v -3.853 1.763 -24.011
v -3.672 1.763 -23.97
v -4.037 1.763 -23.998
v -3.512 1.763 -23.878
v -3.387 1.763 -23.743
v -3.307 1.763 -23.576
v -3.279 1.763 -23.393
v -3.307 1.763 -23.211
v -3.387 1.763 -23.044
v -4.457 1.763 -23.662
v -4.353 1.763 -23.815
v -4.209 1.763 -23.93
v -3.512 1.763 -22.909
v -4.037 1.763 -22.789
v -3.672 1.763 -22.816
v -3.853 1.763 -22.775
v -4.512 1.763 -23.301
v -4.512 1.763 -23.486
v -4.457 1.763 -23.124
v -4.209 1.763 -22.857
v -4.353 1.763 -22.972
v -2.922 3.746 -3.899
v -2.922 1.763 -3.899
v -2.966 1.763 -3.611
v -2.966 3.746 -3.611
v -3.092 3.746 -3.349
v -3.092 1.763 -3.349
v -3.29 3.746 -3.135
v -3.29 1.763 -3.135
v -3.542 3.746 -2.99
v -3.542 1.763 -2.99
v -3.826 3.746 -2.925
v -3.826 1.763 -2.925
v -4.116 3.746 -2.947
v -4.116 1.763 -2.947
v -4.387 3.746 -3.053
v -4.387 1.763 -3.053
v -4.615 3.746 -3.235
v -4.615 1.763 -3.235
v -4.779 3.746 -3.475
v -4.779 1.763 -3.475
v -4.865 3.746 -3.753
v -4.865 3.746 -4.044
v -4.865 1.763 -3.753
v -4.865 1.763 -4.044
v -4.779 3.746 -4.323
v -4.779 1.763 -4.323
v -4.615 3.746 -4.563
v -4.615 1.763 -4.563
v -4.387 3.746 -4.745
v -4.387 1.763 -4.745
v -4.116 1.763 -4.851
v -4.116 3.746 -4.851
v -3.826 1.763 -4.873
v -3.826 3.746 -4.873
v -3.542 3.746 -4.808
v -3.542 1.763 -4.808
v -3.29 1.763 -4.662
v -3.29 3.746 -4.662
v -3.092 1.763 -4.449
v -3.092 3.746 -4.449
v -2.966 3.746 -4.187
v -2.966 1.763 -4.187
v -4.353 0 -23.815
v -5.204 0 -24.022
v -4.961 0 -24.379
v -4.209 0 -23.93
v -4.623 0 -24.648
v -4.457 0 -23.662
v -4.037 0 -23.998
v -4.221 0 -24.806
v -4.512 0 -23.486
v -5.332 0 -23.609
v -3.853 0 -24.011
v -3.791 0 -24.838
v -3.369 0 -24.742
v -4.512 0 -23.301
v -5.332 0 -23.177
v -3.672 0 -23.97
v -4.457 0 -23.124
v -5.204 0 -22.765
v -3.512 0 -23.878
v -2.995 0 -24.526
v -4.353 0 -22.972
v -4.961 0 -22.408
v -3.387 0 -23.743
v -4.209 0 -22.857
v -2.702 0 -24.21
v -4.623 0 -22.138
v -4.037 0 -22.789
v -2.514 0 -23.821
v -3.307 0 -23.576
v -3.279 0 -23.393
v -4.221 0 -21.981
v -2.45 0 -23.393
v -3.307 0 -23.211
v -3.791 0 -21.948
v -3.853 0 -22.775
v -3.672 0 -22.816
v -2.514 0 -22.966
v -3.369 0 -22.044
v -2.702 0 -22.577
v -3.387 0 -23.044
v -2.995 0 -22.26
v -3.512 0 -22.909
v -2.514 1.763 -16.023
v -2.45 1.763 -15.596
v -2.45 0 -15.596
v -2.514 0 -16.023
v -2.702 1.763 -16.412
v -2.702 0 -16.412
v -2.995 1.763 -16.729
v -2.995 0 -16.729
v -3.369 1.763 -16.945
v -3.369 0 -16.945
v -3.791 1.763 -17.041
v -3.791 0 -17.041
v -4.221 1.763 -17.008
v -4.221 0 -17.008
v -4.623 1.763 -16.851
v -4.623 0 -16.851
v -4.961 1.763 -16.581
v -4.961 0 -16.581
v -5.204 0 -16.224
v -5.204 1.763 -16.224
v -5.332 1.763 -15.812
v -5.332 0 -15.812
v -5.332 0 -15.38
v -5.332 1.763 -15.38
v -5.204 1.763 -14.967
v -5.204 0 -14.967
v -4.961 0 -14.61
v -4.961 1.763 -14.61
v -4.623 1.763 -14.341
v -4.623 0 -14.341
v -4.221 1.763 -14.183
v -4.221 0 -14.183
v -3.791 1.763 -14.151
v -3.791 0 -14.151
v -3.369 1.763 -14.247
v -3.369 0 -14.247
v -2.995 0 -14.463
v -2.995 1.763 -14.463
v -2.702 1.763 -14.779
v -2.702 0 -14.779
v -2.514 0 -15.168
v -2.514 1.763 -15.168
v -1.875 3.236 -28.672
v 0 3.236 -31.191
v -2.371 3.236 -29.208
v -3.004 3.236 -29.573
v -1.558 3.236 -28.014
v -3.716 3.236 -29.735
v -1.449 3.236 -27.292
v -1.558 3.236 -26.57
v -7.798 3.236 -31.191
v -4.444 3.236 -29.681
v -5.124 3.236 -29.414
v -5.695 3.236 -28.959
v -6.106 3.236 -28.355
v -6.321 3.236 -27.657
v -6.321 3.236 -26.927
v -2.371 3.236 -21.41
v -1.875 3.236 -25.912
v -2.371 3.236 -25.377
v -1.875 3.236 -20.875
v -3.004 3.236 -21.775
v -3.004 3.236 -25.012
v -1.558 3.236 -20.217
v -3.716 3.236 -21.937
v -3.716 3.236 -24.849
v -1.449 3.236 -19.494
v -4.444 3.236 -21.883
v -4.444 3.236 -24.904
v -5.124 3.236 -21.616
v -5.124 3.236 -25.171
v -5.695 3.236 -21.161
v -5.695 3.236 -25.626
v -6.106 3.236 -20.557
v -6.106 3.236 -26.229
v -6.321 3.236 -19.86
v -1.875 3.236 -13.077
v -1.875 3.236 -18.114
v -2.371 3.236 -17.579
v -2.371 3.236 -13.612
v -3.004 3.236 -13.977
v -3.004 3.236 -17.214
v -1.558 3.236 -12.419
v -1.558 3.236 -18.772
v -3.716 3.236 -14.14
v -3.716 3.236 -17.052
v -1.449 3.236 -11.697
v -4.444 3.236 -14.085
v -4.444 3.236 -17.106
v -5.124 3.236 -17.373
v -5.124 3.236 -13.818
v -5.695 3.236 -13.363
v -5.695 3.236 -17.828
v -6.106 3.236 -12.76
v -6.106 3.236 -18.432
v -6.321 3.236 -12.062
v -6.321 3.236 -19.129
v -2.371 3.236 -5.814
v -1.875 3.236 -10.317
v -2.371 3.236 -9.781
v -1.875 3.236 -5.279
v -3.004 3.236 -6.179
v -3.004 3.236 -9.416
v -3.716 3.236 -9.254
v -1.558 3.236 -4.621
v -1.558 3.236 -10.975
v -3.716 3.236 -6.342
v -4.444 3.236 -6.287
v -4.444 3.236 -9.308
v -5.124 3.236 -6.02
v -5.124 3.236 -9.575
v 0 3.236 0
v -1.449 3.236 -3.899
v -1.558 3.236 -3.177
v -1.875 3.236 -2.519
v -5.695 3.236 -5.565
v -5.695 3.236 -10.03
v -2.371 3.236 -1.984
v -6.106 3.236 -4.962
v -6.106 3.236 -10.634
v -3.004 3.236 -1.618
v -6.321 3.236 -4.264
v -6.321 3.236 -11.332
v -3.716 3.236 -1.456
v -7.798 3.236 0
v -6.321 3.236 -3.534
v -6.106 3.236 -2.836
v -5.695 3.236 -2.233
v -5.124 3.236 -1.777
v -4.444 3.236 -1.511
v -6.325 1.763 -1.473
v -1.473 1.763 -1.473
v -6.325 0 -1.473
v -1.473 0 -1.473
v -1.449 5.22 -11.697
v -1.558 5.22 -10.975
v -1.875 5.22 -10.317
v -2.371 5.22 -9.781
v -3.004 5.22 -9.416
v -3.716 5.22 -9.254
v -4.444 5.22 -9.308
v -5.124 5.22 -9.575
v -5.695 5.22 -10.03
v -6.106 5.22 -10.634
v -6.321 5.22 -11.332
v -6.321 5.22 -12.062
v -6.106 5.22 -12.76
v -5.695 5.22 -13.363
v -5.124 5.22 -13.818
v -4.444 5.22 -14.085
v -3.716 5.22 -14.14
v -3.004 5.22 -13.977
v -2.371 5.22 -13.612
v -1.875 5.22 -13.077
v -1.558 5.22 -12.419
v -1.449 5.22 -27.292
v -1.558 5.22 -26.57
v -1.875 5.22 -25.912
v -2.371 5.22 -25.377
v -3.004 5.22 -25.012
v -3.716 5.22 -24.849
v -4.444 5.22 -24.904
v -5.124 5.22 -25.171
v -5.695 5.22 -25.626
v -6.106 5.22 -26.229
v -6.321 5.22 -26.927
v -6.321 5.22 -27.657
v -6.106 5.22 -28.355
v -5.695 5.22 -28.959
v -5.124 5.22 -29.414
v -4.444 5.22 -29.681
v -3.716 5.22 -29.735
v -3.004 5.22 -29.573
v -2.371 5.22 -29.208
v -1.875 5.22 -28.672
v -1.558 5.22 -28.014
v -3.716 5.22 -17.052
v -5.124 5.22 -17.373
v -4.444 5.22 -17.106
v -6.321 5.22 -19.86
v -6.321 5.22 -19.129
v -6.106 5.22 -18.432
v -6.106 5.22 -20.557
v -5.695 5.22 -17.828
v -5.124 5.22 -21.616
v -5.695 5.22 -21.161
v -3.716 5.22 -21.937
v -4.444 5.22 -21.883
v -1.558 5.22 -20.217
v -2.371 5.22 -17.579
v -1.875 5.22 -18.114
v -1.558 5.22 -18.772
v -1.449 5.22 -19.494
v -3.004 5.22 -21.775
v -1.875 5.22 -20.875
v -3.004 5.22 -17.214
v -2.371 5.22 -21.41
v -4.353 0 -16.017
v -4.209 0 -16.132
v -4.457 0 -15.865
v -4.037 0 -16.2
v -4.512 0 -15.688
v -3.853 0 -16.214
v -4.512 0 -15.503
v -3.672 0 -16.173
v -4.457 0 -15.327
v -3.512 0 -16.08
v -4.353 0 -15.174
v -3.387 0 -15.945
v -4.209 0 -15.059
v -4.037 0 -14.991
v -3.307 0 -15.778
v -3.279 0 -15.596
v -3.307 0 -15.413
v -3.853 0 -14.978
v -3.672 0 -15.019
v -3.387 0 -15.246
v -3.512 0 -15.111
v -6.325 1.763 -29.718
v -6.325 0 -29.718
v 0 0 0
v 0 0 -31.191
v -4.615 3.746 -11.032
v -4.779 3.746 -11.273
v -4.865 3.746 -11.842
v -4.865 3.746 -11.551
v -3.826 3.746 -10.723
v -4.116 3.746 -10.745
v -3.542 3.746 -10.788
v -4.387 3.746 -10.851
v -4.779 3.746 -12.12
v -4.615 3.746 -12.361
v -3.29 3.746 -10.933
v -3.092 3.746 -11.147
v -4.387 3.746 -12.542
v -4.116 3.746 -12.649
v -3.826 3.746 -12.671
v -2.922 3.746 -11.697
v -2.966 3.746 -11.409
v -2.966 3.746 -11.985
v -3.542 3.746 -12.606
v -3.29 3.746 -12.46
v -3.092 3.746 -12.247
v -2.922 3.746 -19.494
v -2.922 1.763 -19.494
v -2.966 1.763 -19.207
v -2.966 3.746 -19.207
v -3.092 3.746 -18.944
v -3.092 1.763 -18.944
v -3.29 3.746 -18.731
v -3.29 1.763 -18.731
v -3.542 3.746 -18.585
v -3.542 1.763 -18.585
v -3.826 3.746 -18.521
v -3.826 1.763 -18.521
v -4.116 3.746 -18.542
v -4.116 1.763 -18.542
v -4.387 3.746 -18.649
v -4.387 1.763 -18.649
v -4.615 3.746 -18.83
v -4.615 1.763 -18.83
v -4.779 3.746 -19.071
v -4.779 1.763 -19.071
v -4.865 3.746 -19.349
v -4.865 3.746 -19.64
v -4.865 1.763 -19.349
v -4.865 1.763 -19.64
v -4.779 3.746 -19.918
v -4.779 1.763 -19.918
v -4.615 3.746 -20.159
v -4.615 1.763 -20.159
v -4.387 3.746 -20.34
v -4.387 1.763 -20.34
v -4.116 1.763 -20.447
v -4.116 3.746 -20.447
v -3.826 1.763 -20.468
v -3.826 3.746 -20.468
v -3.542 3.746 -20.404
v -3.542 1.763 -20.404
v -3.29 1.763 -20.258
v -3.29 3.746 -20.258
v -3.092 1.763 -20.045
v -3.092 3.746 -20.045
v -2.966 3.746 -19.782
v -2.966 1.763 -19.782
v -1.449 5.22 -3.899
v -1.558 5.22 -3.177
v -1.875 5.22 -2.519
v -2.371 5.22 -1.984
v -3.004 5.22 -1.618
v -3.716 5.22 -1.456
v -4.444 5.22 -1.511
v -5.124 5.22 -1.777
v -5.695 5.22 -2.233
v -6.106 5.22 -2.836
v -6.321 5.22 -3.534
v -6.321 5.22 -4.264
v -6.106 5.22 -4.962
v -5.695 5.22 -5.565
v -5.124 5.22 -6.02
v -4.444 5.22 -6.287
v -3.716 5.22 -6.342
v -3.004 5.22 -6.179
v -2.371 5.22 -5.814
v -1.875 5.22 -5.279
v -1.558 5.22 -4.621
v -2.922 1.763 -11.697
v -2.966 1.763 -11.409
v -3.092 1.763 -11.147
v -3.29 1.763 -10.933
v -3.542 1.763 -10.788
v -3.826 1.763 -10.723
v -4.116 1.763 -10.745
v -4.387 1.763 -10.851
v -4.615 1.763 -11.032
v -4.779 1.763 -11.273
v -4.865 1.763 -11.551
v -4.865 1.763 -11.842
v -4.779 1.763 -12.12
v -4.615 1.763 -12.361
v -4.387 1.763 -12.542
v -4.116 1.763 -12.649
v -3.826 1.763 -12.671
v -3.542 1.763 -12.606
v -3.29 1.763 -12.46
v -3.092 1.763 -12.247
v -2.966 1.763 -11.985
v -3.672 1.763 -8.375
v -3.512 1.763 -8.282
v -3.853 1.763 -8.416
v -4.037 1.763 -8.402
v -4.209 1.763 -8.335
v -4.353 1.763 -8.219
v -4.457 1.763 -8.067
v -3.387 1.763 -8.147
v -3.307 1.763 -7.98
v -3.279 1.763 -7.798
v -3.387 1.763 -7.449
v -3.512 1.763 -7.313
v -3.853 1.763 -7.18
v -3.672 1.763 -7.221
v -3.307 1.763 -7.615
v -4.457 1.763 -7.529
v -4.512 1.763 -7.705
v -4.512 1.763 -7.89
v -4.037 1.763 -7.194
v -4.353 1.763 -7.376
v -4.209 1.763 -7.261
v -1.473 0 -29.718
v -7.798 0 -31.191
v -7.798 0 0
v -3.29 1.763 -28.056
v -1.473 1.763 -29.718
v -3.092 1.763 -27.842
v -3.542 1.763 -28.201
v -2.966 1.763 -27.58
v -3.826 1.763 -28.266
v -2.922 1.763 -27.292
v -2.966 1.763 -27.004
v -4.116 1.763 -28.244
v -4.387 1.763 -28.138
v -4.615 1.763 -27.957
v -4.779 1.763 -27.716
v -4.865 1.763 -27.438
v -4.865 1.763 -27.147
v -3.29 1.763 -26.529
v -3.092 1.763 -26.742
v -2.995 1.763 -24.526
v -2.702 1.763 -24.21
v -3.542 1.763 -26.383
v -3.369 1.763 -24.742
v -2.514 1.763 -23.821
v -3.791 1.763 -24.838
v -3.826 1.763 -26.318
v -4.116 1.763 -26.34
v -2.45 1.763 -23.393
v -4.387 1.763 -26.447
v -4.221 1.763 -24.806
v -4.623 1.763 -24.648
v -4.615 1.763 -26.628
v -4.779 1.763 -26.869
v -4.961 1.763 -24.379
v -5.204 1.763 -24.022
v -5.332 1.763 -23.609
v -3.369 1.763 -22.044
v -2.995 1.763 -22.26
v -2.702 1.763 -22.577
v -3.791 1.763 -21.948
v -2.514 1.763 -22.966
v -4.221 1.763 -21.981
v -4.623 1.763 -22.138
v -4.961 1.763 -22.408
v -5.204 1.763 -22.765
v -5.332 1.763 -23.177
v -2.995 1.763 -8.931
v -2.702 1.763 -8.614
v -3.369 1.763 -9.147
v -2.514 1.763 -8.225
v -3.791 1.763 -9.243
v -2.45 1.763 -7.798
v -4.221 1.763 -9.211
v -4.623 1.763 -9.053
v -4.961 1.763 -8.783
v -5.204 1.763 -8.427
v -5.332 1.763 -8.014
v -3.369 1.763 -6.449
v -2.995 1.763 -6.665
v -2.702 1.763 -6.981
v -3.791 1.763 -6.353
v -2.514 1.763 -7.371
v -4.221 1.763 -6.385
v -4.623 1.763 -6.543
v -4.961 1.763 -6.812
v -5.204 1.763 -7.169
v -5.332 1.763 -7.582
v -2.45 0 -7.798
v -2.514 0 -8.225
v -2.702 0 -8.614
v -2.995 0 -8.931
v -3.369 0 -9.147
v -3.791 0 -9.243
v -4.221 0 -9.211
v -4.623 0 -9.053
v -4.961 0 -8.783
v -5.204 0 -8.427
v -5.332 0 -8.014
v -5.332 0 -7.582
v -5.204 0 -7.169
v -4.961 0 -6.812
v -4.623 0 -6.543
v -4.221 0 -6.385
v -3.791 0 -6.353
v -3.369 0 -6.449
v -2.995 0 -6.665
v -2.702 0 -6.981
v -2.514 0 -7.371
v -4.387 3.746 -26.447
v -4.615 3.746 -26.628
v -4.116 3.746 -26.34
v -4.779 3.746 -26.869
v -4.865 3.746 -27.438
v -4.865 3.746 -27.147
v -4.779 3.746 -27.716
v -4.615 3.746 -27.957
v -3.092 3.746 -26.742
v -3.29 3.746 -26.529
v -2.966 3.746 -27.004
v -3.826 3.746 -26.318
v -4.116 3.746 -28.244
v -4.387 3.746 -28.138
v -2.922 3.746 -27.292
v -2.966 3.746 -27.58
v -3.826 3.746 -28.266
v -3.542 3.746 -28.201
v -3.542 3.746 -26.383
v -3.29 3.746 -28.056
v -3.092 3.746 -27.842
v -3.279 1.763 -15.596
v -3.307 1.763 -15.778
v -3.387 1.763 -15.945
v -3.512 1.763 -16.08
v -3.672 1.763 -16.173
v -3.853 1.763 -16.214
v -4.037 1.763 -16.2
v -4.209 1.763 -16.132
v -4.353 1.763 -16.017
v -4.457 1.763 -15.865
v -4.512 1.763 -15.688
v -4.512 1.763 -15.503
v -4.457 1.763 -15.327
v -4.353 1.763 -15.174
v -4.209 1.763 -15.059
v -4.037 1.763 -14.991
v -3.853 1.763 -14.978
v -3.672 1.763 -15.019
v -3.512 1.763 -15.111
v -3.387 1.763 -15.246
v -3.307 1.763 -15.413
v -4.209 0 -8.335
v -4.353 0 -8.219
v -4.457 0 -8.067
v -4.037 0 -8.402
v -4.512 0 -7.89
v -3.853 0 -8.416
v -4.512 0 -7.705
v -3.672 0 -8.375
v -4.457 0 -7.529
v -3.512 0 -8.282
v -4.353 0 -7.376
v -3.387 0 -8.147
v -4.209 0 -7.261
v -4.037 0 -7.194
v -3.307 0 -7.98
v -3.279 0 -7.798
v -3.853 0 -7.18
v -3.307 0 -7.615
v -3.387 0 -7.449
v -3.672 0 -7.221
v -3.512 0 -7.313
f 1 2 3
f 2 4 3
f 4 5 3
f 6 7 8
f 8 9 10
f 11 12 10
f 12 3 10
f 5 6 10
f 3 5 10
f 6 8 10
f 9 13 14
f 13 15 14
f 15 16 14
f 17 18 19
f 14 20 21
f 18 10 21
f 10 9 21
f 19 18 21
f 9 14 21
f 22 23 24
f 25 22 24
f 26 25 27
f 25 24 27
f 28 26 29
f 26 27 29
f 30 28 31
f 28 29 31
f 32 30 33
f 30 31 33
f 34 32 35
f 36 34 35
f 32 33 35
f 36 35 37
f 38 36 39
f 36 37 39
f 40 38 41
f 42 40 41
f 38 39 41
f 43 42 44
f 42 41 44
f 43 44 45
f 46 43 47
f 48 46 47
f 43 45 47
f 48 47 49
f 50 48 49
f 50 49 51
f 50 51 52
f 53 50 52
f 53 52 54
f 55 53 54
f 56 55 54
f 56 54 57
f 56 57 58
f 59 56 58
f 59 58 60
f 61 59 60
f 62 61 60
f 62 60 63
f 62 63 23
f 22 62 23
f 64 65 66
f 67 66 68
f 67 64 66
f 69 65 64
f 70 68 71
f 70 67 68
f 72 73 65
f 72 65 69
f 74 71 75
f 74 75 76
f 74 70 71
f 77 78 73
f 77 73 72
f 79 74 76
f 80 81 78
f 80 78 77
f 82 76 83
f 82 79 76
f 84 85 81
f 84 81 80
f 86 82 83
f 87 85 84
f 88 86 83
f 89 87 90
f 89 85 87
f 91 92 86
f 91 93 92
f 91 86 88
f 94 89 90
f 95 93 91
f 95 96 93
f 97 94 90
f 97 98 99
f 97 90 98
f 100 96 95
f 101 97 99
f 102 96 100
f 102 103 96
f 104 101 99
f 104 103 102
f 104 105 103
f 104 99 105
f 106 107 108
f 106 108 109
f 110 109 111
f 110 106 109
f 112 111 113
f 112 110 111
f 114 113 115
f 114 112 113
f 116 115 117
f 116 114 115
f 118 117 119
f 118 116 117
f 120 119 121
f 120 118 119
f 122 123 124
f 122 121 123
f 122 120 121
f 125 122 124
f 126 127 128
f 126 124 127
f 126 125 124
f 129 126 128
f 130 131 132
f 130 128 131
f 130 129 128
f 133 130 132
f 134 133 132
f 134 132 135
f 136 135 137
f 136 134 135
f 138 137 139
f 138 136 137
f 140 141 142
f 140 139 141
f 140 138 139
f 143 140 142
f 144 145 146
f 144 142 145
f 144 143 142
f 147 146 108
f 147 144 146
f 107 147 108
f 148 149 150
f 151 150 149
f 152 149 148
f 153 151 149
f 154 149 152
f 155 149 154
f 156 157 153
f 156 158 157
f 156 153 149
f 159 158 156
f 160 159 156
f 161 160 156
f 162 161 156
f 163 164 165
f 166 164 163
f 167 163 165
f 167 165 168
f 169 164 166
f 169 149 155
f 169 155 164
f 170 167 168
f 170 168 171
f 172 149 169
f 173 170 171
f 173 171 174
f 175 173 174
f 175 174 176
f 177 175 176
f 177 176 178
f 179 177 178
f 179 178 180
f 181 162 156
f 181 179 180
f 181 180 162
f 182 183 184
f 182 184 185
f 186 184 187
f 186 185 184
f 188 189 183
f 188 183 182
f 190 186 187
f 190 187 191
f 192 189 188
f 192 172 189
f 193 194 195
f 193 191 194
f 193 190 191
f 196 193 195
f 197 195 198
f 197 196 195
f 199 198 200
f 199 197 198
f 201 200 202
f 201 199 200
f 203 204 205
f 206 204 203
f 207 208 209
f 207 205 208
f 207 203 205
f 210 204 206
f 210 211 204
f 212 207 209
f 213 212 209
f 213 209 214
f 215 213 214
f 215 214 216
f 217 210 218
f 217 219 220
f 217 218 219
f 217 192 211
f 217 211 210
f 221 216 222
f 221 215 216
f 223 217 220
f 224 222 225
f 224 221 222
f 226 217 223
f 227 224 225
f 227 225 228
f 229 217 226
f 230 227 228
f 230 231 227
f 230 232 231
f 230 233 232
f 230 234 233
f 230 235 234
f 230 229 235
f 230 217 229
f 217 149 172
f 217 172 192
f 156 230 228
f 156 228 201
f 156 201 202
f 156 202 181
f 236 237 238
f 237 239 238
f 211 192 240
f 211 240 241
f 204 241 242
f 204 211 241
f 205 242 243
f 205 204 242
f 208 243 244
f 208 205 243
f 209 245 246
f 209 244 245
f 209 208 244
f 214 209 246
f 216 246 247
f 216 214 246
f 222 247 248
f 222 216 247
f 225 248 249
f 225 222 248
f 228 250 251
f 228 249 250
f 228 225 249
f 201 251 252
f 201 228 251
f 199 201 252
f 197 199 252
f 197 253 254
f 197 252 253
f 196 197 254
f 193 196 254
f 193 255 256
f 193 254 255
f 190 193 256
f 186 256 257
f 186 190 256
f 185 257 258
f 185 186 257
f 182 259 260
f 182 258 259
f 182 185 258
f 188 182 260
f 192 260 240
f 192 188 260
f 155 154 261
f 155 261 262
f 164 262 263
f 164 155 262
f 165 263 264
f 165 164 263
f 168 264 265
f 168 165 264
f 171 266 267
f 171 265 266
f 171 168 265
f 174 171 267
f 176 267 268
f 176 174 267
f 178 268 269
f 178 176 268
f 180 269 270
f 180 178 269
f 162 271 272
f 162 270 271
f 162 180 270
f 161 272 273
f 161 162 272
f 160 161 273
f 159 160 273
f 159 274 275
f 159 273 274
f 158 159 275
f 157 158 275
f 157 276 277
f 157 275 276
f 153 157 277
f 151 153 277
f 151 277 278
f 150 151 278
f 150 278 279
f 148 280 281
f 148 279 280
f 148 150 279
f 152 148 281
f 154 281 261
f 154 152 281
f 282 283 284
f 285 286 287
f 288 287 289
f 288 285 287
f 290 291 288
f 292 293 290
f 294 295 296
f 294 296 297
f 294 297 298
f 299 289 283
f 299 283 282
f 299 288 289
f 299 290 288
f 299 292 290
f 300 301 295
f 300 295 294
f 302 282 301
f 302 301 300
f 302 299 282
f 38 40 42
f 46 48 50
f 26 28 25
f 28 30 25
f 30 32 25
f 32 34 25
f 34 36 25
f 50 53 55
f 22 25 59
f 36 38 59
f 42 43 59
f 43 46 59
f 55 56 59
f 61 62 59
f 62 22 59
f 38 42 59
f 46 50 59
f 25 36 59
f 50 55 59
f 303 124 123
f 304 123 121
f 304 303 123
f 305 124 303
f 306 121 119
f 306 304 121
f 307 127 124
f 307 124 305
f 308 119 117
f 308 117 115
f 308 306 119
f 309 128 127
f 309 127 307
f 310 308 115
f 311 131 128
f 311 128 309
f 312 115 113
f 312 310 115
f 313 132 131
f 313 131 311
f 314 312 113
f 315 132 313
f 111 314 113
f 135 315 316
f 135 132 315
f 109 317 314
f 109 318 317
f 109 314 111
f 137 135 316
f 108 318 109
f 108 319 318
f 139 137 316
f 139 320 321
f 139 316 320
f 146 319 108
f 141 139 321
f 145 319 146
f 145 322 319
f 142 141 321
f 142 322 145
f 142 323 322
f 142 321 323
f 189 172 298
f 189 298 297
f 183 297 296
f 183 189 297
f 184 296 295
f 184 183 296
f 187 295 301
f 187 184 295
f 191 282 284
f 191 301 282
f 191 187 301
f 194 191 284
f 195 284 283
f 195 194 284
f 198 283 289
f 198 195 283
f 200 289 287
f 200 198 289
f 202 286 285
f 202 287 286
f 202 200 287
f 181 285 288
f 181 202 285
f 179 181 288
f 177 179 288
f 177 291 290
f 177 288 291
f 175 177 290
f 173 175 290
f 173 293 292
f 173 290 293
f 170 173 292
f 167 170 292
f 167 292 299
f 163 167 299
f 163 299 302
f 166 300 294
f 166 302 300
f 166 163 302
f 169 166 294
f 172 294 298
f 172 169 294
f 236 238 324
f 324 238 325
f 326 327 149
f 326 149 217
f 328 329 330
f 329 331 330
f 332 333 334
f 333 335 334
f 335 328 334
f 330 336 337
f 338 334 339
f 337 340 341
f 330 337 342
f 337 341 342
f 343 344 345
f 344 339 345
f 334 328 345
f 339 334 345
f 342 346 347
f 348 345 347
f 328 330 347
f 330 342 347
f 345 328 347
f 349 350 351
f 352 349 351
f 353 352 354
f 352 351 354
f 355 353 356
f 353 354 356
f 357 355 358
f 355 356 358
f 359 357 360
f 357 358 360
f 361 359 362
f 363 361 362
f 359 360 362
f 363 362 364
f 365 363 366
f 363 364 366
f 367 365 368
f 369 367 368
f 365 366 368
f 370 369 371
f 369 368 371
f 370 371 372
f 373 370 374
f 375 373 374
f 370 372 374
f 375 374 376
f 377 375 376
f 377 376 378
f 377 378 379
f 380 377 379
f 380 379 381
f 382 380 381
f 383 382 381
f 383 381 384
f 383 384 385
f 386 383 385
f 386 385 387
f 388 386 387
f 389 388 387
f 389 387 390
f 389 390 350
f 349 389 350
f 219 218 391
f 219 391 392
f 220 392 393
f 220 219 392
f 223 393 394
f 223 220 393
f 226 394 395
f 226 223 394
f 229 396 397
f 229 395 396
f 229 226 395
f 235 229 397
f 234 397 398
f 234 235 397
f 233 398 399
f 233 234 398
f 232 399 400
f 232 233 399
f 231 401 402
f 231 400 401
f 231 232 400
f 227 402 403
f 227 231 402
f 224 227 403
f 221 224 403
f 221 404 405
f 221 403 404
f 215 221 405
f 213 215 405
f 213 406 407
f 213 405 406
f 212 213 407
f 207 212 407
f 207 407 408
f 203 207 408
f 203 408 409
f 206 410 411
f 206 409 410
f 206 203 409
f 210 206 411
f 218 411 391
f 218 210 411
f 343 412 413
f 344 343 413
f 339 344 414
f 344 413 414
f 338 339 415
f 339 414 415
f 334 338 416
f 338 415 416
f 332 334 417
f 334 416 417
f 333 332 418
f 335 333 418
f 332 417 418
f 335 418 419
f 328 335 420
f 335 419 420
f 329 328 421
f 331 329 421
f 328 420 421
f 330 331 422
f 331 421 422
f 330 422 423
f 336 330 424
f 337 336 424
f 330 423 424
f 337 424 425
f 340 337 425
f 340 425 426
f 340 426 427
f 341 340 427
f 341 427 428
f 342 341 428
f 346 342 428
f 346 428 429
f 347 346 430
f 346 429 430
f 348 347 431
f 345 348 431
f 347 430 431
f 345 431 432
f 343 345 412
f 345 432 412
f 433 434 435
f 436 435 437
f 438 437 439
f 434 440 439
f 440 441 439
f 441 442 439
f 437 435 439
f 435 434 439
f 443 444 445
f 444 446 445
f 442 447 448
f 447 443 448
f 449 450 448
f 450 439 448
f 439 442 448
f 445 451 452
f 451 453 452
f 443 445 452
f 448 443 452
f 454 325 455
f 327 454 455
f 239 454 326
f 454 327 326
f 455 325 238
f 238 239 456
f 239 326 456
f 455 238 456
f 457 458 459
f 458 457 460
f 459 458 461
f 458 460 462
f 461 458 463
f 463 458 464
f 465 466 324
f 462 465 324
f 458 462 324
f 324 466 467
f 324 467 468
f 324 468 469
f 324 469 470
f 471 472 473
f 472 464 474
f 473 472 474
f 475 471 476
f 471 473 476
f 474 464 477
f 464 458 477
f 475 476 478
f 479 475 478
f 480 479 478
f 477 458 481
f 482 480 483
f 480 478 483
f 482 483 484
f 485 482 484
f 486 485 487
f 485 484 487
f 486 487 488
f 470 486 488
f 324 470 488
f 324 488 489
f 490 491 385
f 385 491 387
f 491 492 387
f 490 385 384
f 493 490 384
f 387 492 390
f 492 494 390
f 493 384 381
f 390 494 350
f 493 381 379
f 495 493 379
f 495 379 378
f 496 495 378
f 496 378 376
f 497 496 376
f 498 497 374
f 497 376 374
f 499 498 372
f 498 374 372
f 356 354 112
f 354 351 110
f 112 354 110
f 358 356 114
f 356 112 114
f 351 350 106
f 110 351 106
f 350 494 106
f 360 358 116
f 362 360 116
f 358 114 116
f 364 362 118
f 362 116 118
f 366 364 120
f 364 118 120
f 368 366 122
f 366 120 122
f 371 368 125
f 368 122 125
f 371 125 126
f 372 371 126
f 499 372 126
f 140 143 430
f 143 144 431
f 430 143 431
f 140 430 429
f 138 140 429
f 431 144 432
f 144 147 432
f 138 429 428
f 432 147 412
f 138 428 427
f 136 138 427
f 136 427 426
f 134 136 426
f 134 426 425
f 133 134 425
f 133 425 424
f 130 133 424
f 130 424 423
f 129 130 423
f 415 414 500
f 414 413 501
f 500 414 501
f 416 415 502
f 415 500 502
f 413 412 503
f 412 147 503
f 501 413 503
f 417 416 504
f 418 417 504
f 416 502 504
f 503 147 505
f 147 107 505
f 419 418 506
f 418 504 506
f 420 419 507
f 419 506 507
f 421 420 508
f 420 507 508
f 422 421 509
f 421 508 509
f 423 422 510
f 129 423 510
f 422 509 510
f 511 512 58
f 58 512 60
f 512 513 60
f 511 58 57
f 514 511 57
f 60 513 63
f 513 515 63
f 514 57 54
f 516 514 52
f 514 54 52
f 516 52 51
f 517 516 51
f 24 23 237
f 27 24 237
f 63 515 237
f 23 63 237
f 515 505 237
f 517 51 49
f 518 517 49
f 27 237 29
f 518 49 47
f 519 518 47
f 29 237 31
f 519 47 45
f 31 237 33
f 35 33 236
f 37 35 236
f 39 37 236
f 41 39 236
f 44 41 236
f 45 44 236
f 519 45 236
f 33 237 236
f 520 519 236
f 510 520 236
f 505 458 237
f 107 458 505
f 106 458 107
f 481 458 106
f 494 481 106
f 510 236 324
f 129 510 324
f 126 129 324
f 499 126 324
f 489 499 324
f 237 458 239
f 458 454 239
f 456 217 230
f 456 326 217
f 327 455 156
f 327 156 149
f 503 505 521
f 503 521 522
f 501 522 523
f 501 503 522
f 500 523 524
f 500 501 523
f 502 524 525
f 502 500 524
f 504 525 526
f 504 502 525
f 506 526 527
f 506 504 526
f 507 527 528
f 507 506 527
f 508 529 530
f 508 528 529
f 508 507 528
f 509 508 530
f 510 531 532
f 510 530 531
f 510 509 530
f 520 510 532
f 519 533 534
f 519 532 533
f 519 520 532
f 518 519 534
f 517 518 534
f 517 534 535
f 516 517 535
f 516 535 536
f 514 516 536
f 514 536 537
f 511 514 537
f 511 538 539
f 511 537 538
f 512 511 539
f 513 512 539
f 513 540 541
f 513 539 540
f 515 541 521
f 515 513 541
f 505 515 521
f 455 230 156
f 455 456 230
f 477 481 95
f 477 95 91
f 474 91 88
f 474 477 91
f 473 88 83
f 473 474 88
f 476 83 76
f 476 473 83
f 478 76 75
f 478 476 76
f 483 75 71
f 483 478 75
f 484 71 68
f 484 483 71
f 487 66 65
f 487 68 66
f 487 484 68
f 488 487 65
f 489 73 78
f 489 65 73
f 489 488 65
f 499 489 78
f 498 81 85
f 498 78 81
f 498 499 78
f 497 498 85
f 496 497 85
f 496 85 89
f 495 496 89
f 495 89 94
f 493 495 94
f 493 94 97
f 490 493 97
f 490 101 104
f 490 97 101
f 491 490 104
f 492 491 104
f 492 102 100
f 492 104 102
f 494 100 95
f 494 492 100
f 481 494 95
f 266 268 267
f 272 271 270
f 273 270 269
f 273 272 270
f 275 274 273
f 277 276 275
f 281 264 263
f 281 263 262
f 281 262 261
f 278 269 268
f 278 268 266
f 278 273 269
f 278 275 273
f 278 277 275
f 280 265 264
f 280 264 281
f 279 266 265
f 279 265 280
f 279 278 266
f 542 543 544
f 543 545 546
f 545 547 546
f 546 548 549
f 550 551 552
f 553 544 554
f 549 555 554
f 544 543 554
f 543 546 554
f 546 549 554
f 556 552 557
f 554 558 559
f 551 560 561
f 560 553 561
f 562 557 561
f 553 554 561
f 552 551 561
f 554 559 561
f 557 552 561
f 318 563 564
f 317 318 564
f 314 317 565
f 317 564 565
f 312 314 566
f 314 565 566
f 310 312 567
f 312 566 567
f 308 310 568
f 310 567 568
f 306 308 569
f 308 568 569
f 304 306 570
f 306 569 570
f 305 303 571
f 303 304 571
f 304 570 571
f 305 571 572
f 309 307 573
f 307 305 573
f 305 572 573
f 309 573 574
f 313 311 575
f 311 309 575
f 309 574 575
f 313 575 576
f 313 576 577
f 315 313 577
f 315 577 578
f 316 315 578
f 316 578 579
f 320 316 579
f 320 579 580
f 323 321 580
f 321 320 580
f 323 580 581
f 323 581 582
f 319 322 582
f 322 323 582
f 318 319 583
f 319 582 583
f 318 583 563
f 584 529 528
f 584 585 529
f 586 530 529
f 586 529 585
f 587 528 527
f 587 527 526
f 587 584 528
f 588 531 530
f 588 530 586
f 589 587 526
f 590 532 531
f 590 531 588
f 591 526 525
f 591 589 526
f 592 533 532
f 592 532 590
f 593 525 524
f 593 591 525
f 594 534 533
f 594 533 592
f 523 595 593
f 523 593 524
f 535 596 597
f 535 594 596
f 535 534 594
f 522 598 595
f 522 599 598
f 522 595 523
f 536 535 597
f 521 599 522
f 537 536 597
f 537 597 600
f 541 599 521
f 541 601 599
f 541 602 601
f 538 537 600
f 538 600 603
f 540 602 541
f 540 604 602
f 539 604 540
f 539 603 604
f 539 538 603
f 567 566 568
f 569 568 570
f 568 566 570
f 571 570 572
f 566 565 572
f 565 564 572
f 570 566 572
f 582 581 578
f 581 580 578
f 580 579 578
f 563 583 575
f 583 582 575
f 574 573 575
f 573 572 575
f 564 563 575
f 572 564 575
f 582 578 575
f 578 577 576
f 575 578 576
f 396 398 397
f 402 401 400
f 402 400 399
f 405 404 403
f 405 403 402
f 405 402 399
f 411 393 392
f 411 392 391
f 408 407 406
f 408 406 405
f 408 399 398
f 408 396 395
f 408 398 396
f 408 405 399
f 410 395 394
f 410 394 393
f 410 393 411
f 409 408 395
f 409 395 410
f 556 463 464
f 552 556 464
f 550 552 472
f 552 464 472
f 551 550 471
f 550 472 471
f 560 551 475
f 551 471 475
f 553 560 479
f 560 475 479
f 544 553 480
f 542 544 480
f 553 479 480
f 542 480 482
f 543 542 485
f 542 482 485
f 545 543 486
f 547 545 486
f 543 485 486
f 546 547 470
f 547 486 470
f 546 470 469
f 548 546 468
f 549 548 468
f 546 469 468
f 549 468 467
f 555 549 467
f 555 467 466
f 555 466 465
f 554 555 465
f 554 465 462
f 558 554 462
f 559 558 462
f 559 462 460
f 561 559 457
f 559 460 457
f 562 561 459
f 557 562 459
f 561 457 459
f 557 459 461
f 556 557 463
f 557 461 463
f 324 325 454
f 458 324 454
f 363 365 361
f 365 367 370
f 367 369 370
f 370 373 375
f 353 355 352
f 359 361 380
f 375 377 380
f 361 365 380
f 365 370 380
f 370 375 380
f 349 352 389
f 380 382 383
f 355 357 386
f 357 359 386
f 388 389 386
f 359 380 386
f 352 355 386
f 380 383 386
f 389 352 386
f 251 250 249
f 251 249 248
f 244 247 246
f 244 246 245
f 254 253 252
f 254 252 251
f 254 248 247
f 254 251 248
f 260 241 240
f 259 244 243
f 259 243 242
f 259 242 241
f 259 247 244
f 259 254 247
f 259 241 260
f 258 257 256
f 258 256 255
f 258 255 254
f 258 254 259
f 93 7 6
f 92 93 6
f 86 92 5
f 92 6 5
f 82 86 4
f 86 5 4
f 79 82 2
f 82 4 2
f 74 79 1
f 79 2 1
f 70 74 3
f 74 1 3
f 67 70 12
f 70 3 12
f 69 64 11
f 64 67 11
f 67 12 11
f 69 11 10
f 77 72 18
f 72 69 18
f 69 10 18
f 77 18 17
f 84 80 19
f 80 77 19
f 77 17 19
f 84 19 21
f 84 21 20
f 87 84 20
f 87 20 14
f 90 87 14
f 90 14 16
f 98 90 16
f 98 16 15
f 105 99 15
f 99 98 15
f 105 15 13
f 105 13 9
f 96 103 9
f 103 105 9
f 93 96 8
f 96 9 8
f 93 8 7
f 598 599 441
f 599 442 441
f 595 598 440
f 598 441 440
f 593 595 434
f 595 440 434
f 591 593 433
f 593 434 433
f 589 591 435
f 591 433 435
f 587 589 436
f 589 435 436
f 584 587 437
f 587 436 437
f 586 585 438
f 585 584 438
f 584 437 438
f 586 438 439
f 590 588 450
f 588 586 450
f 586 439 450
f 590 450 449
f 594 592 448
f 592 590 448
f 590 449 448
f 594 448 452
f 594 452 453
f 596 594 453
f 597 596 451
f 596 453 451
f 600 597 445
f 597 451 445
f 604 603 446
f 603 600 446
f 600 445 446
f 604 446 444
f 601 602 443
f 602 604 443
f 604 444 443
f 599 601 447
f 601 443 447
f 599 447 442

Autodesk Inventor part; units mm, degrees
ref_plane "YZ Plane" through (0, 0, 0) normal (1, 0, 0) x (0, 1, 0)
ref_plane "XZ Plane" through (0, 0, 0) normal (0, 1, 0) x (-1, 0, 0)
ref_plane "XY Plane" through (0, 0, 0) normal (0, 0, 1) x (1, 0, 0)
sketch "Sketch1" plane through (0, 0, 0) normal (0, 1, 0) x (-1, 0, 0)
  line L0 (0, 0) -> (7.7978, 0)
  line L1 (7.7978, 0) -> (7.7978, -31.1912)
  line L2 (7.7978, -31.1912) -> (0, -31.1912)
  line L3 (0, -31.1912) -> (0, 0)
  dimension "d0" = 7.7978
  dimension "d1" = 31.1912
extrude "Extrusion1" add sketch "Sketch1" along normal blind 3.236
sketch "Sketch2" plane through (0, 3.236, 0) normal (0, 1, 0) x (1, 0, 0)
  line L0 (0, 0) -> (-3.8989, 0) construction
  line L1 (-3.8989, 0) -> (-3.8989, 3.8989) construction
  line L2 (-3.8989, 3.8989) -> (0, 3.8989) construction
  line L3 (0, 3.8989) -> (0, 0) construction
  circle A0 centre (-3.8989, 3.8989) radius 2.4498
  dimension "d4" = 3.8989
  dimension "d5" = 3.8989
  dimension "d6" = 4.8997
extrude "Extrusion2" add sketch "Sketch2" along normal blind 1.9837
pattern_linear "Rectangular Pattern1" count 4 spacing 7.7978 along (0, 0, -1) of "Extrusion2"
shell "Shell1" thickness 1.4732 removed faces 1 at (-2.5993, 0, -10.3971)
sketch "Sketch3" plane through (-6.3246, 1.7628, -1.4732) normal (0, -1, 0) x (1, 0, 0)
  circle A0 centre (2.4257, -2.4257) radius 2.4498 construction
  circle A1 centre (2.4257, -10.2235) radius 2.4498 construction
  line L0 (2.4257, -2.4257) -> (2.4257, -10.2235) construction
  circle A2 centre (2.4257, -6.3246) radius 0.6198
  circle A3 centre (2.4257, -6.3246) radius 1.4491
  point P0 (6.3246, 1.4732)
  dimension "d13" = 1.2395
extrude "Extrusion3" add sketch "Sketch3" along normal up to surface (1.7628 mm away)
pattern_linear "Rectangular Pattern2" count 3 spacing 7.7978 along (0, 0, -1) of "Extrusion3"
properties part number "1x4 short black pegged" material "ABS Plastic"
